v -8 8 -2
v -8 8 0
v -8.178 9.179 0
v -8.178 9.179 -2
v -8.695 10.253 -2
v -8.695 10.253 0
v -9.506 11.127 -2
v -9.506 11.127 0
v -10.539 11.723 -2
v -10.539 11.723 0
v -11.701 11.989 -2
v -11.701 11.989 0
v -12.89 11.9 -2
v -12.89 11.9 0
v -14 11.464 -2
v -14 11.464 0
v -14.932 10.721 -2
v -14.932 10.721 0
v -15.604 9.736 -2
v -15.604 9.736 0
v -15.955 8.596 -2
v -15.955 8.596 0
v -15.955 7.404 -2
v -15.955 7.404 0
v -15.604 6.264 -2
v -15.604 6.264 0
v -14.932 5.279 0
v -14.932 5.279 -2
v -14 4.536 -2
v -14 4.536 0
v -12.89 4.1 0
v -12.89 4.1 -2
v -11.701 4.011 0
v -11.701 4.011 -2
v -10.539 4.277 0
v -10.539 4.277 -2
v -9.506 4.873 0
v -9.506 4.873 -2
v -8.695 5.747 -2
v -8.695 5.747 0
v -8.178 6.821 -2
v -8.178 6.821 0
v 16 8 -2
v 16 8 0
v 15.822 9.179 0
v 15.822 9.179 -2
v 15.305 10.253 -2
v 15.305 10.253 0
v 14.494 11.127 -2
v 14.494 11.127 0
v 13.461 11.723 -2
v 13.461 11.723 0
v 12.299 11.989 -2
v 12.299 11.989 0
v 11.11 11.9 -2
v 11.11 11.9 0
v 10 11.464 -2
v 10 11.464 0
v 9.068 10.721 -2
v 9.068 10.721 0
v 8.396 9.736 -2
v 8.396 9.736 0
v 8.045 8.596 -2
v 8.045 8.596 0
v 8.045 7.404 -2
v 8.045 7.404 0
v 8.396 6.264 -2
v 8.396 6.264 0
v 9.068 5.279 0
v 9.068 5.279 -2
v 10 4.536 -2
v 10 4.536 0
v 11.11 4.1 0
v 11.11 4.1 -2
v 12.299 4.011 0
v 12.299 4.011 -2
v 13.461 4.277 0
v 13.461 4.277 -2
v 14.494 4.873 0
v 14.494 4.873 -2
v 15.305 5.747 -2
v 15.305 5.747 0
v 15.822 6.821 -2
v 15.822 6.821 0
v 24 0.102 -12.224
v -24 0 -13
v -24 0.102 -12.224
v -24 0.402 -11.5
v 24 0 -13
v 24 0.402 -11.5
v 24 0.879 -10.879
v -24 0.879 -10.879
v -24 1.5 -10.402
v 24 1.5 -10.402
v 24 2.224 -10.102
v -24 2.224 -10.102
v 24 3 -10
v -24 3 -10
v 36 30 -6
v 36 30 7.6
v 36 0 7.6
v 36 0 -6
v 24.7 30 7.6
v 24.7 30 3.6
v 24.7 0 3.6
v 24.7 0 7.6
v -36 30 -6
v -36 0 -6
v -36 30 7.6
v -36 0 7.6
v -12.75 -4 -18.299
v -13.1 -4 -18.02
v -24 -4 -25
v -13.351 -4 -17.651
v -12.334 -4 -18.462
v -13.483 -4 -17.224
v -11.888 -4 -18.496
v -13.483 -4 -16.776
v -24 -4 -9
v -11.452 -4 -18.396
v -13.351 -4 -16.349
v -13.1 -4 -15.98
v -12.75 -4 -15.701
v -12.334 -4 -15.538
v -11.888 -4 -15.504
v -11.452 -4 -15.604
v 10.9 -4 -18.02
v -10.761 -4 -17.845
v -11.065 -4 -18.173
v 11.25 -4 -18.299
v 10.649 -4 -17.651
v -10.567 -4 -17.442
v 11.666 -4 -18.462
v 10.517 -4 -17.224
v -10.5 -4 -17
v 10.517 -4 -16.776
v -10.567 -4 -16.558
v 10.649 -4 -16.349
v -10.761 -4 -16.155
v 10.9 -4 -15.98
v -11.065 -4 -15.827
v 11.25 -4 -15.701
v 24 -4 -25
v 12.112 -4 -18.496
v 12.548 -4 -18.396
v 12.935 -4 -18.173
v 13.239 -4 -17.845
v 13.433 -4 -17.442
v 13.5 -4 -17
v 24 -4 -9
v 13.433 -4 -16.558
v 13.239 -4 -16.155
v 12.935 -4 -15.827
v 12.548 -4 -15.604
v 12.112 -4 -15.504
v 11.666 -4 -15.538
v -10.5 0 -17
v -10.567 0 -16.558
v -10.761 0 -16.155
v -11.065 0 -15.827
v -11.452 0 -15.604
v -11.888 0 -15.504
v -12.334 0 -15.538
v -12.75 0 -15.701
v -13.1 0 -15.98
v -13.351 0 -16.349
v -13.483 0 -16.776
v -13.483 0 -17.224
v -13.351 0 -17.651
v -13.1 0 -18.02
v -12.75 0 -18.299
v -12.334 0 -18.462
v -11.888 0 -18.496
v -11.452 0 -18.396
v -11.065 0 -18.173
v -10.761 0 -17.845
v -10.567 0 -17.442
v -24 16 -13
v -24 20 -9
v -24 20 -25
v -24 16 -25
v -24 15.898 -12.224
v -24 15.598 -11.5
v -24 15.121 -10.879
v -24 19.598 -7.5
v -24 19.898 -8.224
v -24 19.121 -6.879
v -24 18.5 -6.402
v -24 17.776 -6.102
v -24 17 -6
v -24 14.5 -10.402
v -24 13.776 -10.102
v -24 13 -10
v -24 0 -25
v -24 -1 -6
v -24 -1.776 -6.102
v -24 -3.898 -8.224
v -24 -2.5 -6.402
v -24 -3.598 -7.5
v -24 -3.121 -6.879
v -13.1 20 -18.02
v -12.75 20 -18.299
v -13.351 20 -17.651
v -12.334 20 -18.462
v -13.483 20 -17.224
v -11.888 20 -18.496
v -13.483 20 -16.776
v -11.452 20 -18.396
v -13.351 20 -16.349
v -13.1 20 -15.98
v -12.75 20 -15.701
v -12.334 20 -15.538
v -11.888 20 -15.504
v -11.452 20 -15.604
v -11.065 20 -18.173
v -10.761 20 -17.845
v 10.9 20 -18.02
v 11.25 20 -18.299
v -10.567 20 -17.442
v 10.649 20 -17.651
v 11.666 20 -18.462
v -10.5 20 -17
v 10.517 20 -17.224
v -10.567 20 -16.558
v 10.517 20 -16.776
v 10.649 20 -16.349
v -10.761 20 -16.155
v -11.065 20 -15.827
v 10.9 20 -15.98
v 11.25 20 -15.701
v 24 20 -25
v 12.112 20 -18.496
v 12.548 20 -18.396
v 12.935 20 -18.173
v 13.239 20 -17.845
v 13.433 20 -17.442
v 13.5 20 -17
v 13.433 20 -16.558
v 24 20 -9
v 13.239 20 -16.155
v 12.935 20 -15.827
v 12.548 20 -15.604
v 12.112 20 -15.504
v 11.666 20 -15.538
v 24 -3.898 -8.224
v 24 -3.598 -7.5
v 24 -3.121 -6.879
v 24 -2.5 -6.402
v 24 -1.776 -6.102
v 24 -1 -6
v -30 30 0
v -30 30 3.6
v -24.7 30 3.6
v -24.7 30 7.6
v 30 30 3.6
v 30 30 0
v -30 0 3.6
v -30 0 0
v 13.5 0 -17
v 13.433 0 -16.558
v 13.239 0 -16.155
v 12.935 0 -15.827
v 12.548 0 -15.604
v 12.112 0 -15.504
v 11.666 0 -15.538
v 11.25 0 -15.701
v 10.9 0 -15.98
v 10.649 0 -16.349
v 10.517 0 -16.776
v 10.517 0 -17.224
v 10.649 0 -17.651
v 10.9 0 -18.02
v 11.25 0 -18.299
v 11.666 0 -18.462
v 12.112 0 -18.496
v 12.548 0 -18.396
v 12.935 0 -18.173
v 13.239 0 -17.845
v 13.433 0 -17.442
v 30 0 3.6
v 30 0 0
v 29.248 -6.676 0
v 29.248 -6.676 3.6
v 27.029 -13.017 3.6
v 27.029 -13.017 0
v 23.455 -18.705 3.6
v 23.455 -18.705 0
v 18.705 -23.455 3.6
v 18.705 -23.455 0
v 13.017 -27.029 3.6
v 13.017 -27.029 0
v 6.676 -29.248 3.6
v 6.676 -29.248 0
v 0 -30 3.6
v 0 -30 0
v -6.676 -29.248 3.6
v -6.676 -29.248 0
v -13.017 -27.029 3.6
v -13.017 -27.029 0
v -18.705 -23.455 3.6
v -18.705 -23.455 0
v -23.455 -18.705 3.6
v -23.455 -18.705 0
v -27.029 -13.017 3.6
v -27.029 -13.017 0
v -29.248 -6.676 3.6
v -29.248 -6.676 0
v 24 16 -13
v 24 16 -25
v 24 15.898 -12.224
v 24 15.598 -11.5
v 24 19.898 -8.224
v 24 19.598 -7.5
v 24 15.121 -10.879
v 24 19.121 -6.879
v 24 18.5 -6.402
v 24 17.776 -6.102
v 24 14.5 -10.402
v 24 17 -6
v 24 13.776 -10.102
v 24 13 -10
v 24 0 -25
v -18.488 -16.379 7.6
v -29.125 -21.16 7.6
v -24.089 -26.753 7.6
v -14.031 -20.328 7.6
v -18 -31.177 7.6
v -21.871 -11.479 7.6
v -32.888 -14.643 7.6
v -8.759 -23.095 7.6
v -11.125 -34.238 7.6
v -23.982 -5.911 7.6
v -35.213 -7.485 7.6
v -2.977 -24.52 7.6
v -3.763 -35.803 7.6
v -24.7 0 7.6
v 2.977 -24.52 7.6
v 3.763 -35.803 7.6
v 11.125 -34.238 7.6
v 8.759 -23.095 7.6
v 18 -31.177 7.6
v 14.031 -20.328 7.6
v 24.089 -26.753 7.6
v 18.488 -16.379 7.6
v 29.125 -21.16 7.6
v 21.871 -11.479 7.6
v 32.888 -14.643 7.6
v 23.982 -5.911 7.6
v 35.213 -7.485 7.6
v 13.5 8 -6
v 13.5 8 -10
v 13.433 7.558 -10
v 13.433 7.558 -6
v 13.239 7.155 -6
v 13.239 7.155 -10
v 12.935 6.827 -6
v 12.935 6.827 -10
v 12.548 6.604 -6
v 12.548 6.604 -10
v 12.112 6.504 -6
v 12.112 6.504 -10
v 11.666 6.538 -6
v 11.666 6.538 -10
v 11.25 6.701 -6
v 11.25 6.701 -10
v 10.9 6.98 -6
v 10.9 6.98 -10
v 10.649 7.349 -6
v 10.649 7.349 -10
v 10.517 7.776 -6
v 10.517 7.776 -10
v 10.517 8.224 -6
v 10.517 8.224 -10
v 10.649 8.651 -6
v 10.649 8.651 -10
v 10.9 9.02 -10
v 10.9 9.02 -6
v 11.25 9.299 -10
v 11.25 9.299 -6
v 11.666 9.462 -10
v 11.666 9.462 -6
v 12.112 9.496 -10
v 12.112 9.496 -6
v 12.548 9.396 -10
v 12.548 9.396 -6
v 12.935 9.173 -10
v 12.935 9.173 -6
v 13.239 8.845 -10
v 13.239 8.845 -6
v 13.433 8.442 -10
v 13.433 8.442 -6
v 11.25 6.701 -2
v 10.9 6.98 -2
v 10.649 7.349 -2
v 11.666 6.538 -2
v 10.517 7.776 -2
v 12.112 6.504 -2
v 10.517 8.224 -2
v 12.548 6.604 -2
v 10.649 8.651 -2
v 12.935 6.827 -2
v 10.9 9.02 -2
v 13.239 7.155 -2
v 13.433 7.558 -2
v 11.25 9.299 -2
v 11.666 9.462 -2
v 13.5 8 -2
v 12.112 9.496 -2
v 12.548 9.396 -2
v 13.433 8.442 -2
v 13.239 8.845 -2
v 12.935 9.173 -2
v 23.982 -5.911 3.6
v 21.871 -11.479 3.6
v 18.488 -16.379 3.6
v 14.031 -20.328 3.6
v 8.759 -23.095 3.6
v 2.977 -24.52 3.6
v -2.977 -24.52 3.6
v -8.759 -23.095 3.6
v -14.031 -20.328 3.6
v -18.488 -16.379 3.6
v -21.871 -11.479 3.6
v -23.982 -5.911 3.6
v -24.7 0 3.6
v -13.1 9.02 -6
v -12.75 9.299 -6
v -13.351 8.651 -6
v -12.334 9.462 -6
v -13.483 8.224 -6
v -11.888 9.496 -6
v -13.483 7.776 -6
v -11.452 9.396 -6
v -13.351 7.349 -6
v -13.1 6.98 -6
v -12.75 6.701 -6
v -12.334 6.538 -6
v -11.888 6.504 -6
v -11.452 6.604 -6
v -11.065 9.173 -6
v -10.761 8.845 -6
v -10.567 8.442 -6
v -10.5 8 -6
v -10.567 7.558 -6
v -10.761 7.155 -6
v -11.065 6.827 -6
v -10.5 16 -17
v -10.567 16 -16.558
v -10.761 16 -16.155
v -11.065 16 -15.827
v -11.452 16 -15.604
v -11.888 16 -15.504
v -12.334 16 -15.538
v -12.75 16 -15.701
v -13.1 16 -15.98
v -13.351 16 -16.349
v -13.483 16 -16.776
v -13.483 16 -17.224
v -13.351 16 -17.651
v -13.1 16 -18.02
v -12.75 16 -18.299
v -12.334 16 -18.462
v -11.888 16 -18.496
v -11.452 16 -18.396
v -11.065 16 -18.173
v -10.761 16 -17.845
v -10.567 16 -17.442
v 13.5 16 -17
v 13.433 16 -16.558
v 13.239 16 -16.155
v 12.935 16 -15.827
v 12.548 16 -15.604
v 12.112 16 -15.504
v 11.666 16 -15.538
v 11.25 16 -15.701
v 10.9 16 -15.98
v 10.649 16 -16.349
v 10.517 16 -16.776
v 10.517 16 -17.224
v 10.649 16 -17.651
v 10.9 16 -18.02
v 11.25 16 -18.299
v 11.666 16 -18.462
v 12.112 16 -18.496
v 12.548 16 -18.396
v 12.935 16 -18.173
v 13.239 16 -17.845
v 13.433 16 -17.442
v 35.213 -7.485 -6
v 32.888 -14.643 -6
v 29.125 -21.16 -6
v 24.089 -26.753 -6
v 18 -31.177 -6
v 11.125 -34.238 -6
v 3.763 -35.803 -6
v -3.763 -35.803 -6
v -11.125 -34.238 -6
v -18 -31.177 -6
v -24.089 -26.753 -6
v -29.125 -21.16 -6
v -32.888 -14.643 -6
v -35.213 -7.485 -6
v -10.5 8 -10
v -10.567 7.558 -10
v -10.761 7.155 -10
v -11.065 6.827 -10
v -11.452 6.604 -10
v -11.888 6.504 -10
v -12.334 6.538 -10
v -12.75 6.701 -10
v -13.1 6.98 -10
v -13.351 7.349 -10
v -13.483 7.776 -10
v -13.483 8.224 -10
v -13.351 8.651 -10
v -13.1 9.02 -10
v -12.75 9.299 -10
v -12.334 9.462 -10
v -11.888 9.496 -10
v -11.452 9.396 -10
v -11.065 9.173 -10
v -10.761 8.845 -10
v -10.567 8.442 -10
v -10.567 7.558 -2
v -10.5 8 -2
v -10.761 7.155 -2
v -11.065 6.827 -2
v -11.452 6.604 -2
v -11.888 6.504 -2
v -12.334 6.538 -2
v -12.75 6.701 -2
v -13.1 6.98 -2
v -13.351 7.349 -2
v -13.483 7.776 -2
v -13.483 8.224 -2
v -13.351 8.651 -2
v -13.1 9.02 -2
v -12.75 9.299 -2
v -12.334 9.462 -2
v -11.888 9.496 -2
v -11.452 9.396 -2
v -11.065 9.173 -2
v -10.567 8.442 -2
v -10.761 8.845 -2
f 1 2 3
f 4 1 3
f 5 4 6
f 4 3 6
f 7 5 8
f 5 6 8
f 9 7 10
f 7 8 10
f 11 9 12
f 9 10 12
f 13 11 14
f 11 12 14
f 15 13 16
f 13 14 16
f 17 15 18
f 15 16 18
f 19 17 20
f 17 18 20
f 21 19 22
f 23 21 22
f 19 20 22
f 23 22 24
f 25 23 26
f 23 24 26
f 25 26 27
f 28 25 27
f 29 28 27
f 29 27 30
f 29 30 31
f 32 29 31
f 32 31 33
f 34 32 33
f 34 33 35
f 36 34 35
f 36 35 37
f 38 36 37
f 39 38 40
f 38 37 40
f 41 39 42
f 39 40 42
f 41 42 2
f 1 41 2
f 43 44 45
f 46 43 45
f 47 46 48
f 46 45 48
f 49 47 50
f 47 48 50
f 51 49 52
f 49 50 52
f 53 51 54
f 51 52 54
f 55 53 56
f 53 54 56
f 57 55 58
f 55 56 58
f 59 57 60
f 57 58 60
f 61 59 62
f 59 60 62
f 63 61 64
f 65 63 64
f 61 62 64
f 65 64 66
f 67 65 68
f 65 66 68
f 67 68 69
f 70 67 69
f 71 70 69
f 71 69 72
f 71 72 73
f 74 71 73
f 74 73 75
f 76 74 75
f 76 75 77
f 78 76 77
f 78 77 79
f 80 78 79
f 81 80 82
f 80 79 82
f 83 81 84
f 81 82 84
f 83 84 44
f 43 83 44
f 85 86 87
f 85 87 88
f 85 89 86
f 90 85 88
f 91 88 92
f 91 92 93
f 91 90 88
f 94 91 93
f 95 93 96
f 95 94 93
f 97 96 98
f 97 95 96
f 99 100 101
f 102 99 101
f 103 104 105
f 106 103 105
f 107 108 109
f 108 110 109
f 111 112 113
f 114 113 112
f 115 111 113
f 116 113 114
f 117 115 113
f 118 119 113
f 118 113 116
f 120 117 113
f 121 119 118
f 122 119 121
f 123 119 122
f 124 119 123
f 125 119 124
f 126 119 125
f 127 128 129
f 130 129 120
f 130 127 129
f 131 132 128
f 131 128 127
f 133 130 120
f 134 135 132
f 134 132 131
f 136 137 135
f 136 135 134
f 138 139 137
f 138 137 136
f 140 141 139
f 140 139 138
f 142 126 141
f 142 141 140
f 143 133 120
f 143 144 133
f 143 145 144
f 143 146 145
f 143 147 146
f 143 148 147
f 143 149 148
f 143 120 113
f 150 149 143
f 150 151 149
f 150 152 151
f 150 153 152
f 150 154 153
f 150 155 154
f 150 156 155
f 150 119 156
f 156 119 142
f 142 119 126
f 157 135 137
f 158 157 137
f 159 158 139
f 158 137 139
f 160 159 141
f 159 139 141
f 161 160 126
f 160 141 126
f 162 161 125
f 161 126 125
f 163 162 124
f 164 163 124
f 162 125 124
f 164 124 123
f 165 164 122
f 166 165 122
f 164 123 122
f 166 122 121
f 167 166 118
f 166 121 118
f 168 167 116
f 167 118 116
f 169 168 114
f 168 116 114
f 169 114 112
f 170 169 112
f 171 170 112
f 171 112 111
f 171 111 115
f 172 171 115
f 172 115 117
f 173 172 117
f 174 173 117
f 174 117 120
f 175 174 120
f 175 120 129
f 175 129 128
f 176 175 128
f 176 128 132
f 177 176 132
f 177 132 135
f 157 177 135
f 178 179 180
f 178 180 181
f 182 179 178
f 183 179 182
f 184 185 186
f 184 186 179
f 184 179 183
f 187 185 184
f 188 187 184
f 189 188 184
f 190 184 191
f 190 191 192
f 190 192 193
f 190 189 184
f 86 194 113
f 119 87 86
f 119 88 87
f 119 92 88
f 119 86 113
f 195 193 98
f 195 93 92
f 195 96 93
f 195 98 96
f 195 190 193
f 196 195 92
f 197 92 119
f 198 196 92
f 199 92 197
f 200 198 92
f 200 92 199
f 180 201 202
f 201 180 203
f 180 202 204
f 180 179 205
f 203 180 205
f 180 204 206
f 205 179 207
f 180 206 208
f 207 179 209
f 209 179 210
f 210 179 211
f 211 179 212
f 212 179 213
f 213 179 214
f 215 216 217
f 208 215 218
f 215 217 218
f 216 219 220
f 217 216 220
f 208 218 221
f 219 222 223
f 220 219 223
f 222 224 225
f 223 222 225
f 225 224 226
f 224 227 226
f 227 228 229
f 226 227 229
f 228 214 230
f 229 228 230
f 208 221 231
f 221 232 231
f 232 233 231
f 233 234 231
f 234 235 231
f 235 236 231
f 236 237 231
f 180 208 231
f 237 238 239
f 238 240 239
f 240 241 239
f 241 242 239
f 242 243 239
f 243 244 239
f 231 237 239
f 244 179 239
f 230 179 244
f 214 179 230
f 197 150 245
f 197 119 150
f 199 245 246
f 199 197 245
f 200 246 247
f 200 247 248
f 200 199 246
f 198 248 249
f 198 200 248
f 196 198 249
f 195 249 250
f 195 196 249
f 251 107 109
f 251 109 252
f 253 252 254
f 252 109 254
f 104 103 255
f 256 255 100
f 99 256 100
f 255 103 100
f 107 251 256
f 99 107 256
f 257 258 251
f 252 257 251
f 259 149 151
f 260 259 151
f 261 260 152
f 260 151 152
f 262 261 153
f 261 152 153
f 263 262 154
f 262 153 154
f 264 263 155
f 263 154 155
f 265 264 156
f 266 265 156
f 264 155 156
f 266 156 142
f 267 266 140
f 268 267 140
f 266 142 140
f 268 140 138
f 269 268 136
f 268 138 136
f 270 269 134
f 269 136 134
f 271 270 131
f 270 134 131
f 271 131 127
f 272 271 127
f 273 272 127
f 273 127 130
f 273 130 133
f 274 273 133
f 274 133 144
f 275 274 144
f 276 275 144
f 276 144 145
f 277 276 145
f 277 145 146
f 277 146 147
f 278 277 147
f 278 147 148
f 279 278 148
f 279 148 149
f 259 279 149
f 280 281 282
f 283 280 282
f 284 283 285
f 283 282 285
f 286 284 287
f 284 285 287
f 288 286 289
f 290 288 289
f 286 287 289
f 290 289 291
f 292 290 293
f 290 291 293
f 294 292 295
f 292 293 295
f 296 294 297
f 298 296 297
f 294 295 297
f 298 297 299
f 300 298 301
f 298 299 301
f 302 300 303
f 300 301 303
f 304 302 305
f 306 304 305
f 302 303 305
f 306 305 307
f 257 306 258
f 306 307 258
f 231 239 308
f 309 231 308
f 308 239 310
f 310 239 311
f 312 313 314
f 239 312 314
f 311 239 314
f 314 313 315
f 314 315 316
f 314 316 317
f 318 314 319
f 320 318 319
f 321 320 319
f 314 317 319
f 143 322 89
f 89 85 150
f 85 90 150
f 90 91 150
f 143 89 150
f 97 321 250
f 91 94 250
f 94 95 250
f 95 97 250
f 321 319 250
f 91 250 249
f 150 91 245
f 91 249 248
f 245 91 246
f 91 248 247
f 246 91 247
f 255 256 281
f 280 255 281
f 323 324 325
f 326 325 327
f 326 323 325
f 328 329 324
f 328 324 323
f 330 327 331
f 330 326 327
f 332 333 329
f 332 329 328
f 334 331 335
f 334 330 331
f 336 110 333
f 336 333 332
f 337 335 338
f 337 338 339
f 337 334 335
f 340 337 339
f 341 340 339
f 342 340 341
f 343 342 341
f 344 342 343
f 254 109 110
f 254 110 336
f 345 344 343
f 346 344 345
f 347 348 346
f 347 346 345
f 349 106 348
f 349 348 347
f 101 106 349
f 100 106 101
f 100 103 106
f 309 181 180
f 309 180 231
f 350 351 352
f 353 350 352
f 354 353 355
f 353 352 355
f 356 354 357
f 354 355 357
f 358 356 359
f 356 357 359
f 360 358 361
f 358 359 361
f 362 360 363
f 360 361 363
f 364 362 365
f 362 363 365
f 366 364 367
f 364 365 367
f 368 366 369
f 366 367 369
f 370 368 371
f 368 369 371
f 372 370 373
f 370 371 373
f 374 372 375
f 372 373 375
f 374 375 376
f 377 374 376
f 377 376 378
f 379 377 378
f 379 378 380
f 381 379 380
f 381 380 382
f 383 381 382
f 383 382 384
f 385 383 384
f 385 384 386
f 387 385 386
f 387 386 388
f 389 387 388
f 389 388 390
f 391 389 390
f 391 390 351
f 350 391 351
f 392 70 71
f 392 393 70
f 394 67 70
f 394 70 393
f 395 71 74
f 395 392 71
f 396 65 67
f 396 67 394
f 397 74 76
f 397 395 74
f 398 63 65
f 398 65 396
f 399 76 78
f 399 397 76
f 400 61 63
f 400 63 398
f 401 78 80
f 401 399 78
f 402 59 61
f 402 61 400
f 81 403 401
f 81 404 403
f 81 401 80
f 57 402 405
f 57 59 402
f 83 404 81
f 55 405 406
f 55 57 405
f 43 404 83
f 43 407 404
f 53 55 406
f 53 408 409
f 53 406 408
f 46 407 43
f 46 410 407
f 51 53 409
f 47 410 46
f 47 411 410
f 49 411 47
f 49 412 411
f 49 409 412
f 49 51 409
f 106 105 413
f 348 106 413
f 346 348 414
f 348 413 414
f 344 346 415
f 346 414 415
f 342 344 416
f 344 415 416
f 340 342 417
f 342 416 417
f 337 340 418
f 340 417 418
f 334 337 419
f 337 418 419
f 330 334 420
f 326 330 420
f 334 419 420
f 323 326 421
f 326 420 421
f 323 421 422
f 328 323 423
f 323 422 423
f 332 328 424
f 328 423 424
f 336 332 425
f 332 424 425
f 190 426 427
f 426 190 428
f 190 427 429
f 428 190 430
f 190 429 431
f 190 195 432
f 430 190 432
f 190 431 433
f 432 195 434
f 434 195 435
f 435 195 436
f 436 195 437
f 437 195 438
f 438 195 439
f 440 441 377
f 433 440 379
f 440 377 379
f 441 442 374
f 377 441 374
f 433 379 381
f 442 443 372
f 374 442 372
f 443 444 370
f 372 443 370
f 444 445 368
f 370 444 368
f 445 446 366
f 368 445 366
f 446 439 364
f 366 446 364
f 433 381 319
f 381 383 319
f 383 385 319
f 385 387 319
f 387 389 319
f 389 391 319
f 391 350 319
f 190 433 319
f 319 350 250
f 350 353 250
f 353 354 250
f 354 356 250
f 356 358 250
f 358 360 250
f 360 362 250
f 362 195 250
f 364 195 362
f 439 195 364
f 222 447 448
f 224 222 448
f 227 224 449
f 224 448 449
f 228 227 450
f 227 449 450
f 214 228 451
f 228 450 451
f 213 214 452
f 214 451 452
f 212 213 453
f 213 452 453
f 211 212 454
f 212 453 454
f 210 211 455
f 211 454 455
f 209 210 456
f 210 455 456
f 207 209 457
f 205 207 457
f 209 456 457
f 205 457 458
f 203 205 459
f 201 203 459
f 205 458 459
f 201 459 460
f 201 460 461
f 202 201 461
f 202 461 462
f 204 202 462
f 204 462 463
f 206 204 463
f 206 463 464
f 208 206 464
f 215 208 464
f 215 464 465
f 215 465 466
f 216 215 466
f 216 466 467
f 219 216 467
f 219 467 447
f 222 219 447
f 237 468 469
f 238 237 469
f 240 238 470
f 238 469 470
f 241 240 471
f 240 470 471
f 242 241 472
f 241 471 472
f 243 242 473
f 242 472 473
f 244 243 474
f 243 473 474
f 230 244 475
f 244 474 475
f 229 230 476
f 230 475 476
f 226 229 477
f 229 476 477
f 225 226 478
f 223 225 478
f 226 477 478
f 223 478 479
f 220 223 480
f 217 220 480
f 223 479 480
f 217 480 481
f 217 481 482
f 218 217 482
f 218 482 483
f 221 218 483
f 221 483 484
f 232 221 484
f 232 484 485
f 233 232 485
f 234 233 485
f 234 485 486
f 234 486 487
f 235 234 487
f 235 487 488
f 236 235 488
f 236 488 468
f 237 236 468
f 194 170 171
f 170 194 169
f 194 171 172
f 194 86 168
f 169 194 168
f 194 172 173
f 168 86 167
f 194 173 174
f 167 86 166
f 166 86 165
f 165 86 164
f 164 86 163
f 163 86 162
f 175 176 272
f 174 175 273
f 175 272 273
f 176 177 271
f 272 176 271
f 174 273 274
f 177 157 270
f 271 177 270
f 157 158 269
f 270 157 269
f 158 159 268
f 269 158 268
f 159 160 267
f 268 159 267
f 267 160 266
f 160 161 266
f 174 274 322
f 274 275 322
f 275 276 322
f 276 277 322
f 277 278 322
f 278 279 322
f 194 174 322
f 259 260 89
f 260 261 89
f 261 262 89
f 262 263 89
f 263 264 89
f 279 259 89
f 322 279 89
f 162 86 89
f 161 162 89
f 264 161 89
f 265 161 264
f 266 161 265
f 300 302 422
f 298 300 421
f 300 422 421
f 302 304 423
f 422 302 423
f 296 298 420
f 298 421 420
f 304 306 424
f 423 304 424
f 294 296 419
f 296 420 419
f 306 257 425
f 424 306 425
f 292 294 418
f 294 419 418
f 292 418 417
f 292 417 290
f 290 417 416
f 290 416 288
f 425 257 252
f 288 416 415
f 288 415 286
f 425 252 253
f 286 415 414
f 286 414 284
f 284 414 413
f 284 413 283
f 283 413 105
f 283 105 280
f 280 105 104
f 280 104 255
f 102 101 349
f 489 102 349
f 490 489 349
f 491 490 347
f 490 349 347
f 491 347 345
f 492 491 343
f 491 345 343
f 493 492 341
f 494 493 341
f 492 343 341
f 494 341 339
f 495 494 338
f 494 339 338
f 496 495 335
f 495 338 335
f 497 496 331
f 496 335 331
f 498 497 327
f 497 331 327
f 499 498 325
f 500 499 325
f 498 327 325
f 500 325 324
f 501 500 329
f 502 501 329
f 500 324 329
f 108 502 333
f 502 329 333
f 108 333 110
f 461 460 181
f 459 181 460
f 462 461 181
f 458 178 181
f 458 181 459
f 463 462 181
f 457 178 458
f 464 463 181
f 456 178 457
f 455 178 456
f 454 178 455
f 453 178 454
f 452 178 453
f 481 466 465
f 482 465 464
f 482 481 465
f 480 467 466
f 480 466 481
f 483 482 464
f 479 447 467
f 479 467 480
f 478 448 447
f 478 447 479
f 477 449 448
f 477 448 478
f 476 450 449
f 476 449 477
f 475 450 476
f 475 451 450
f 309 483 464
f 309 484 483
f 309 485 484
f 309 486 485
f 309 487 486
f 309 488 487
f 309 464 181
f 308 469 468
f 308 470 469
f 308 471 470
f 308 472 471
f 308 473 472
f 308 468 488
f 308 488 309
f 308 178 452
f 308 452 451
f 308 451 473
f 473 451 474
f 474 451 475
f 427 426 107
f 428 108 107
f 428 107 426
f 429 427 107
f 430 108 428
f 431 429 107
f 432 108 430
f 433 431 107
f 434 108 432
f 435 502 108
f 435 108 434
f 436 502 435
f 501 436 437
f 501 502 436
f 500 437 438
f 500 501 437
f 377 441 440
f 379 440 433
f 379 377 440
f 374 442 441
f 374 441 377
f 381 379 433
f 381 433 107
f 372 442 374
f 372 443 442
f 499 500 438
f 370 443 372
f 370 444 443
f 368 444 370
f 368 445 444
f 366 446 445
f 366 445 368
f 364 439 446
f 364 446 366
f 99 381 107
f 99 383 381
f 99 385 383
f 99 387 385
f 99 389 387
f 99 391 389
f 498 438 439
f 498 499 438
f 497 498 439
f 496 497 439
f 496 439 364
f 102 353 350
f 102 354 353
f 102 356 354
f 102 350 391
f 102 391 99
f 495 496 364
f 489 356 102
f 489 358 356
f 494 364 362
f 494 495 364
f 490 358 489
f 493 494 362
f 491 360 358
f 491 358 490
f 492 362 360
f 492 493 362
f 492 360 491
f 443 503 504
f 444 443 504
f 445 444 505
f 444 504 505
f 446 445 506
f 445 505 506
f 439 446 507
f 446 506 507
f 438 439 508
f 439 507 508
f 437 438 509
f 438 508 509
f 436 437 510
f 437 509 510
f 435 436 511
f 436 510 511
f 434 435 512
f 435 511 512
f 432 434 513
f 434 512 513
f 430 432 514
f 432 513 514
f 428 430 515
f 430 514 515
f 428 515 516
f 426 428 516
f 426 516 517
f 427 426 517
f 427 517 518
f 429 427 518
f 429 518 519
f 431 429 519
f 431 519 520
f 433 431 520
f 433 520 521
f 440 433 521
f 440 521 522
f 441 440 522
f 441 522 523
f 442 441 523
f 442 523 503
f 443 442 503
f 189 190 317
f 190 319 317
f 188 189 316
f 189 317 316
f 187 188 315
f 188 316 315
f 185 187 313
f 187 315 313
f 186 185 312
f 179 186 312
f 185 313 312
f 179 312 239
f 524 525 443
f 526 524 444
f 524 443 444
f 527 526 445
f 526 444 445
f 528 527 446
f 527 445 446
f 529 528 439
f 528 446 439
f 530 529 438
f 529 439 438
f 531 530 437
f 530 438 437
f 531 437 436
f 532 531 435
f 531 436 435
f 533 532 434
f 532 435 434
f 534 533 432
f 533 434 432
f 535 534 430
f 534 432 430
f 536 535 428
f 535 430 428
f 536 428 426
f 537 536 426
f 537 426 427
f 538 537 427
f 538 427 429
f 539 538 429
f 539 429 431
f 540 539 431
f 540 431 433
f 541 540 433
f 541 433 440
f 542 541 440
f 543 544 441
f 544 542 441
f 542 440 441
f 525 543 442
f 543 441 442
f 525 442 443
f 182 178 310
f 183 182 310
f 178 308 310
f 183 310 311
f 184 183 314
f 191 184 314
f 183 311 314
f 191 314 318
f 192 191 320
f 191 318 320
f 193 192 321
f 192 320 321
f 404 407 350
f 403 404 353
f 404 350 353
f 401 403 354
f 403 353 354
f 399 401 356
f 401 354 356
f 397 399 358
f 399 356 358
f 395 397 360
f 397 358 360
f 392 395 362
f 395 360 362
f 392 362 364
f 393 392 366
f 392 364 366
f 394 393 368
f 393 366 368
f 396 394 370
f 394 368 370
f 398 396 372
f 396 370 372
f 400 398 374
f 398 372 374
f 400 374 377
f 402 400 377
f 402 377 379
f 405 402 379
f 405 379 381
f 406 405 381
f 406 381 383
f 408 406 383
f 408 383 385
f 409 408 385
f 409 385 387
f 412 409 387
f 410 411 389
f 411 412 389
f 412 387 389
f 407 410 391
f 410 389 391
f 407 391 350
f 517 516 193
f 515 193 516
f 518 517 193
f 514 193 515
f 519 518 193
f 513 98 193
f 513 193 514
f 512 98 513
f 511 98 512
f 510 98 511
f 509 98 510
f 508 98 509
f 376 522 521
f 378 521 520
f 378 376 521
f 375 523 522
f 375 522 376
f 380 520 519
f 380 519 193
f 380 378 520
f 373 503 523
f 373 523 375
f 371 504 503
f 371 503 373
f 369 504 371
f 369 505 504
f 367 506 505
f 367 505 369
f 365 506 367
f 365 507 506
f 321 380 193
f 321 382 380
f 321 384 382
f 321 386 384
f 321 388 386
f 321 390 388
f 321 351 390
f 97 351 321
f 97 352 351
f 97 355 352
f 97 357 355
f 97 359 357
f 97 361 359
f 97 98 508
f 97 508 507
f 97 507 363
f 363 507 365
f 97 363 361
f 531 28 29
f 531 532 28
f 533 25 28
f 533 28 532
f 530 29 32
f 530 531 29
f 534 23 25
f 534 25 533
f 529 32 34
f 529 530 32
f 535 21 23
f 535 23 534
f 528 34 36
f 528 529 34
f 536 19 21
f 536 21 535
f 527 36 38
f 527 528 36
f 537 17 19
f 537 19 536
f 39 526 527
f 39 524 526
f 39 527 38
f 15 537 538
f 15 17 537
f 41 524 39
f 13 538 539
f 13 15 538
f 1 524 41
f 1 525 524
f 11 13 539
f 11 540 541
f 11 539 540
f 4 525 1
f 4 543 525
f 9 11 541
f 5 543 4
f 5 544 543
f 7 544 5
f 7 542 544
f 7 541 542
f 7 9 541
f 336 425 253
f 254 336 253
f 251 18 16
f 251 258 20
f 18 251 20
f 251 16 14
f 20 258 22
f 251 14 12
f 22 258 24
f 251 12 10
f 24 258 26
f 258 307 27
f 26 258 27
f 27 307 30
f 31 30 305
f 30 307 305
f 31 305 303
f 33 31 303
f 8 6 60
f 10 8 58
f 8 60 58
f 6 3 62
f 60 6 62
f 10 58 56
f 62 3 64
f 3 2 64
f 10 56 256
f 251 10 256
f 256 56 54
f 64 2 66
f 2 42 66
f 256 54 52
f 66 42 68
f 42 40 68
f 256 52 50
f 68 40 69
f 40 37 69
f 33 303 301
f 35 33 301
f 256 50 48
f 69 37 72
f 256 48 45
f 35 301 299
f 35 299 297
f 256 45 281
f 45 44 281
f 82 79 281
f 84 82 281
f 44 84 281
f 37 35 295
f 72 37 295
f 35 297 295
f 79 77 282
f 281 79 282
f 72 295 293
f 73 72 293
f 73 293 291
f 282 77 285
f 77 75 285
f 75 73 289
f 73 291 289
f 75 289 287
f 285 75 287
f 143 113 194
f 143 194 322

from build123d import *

# Parameters (mm, degrees)
F1_DEPTH  = 3.6
F3_DEPTH  = 4
F5_DEPTH  = 6
F6_W      = 12
F6_H      = 24
F6_W_2    = 24
F7_DEPTH  = 4
F8_W      = 48
F8_H      = 4
F9_DEPTH  = 15
F10_R     = 1.5
F11_DEPTH = 10
F12_R     = 4
F12_R_2   = 1.5
F13_DEPTH = 2
F14_R     = 3
F15_R     = 1.5
F16_DEPTH = 34.001


with BuildPart() as f1:
    # F0 (on Top) → F1 (new body)
    with BuildSketch(Plane.XY):
        with BuildLine():
            ThreePointArc((30, 0), (0, -30), (-30, 0))
            Line((-30, 0), (-30, 30))
            Line((-30, 30), (-36, 30))
            Line((-36, 30), (-36, 0))
            ThreePointArc((-36, 0), (0, -36), (36, 0))
            Line((36, 0), (36, 30))
            Line((36, 30), (30, 30))
            Line((30, 30), (30, 0))
        make_face()
    extrude(amount=F1_DEPTH)

    # F2 (on face) → F3 (join)
    with BuildSketch(Plane.XY.offset(3.6)):
        with BuildLine():
            Line((-30, 30), (-30, 0))
            ThreePointArc((-30, 0), (0, -30), (30, 0))
            Line((30, 0), (30, 30))
            Line((30, 30), (24.7, 30))
            Line((24.7, 30), (24.7, 0))
            ThreePointArc((24.7, 0), (0, -24.7), (-24.7, 0))
            Line((-24.7, 0), (-24.7, 30))
            Line((-24.7, 30), (-30, 30))
        make_face()
        with BuildLine():
            ThreePointArc((30, 0), (0, -30), (-30, 0))
            Line((-30, 0), (-30, 30))
            Line((-30, 30), (-36, 30))
            Line((-36, 30), (-36, 0))
            ThreePointArc((-36, 0), (0, -36), (36, 0))
            Line((36, 0), (36, 30))
            Line((36, 30), (30, 30))
            Line((30, 30), (30, 0))
        make_face()
    extrude(amount=F3_DEPTH)

    # F4 (on face) → F5 (join)
    with BuildSketch(Plane(origin=(0, 0, 0), x_dir=(1, 0, 0), z_dir=(0, 0, -1))):
        with BuildLine():
            ThreePointArc((36, 0), (0, 36), (-36, 0))
            Line((-36, 0), (-36, -30))
            Line((-36, -30), (-30, -30))
            Line((-30, -30), (30, -30))
            Line((30, -30), (36, -30))
            Line((36, -30), (36, 0))
        make_face()
    extrude(amount=F5_DEPTH)


with BuildPart() as f7:
    # F6 (on face) → F7 (new body)
    with BuildSketch(Plane(origin=(0, 0, -6), x_dir=(1, 0, 0), z_dir=(0, 0, -1))):
        with Locations((18, -8)):
            Rectangle(F6_W, F6_H)
        with Locations((-18, -8)):
            Rectangle(F6_W, F6_H)
        with Locations((0, -8)):
            Rectangle(F6_W_2, F6_H)
    extrude(amount=F7_DEPTH)

    # F8 (on face) → F9 (join)
    with BuildSketch(Plane(origin=(0, 0, -10), x_dir=(1, 0, 0), z_dir=(0, 0, -1))):
        with Locations((0, 2)):
            Rectangle(F8_W, F8_H)
        with Locations((0, -18)):
            Rectangle(F8_W, F8_H)
    extrude(amount=F9_DEPTH)


with BuildPart() as f11_tool:
    # F10 (on face) → F11 (new body)
    with BuildSketch(Plane(origin=(0, 0, -10), x_dir=(1, 0, 0), z_dir=(0, 0, -1))):
        with Locations((12, -8)):
            Circle(F10_R)
        with Locations((-12, -8)):
            Circle(F10_R)
    extrude(amount=-F11_DEPTH)


with BuildPart() as f1_1:
    add(f1.part)

    # F11: cut by f11_tool
    add(f11_tool.part, mode=Mode.SUBTRACT)

    # F12 (on face) → F13 (cut)
    with BuildSketch(Plane.XY):
        with Locations((-12, 8)):
            Circle(F12_R)
        with Locations((-12, 8)):
            Circle(F12_R_2, mode=Mode.SUBTRACT)
        with Locations((12, 8)):
            Circle(F12_R)
        with Locations((12, 8)):
            Circle(F12_R_2, mode=Mode.SUBTRACT)
    extrude(amount=-F13_DEPTH, mode=Mode.SUBTRACT)


with BuildPart() as f7_1:
    add(f7.part)

    # F11: cut by f11_tool
    add(f11_tool.part, mode=Mode.SUBTRACT)

    # F14
    f14_edges = [f7_1.edges().sort_by_distance(p)[0] for p in [
        (0, 0, -10),
        (0, 16, -10),
        (0, -4, -6),
        (0, 20, -6),
    ]]
    fillet(f14_edges, radius=F14_R)

    # F15 (on face) → F16 (cut, through all)
    with BuildSketch(Plane.XZ.offset(4)):
        with Locations((-12, -17)):
            Circle(F15_R)
        with Locations((12, -17)):
            Circle(F15_R)
    extrude(amount=-F16_DEPTH, mode=Mode.SUBTRACT)


solid = Compound([f1_1.part, f7_1.part])
